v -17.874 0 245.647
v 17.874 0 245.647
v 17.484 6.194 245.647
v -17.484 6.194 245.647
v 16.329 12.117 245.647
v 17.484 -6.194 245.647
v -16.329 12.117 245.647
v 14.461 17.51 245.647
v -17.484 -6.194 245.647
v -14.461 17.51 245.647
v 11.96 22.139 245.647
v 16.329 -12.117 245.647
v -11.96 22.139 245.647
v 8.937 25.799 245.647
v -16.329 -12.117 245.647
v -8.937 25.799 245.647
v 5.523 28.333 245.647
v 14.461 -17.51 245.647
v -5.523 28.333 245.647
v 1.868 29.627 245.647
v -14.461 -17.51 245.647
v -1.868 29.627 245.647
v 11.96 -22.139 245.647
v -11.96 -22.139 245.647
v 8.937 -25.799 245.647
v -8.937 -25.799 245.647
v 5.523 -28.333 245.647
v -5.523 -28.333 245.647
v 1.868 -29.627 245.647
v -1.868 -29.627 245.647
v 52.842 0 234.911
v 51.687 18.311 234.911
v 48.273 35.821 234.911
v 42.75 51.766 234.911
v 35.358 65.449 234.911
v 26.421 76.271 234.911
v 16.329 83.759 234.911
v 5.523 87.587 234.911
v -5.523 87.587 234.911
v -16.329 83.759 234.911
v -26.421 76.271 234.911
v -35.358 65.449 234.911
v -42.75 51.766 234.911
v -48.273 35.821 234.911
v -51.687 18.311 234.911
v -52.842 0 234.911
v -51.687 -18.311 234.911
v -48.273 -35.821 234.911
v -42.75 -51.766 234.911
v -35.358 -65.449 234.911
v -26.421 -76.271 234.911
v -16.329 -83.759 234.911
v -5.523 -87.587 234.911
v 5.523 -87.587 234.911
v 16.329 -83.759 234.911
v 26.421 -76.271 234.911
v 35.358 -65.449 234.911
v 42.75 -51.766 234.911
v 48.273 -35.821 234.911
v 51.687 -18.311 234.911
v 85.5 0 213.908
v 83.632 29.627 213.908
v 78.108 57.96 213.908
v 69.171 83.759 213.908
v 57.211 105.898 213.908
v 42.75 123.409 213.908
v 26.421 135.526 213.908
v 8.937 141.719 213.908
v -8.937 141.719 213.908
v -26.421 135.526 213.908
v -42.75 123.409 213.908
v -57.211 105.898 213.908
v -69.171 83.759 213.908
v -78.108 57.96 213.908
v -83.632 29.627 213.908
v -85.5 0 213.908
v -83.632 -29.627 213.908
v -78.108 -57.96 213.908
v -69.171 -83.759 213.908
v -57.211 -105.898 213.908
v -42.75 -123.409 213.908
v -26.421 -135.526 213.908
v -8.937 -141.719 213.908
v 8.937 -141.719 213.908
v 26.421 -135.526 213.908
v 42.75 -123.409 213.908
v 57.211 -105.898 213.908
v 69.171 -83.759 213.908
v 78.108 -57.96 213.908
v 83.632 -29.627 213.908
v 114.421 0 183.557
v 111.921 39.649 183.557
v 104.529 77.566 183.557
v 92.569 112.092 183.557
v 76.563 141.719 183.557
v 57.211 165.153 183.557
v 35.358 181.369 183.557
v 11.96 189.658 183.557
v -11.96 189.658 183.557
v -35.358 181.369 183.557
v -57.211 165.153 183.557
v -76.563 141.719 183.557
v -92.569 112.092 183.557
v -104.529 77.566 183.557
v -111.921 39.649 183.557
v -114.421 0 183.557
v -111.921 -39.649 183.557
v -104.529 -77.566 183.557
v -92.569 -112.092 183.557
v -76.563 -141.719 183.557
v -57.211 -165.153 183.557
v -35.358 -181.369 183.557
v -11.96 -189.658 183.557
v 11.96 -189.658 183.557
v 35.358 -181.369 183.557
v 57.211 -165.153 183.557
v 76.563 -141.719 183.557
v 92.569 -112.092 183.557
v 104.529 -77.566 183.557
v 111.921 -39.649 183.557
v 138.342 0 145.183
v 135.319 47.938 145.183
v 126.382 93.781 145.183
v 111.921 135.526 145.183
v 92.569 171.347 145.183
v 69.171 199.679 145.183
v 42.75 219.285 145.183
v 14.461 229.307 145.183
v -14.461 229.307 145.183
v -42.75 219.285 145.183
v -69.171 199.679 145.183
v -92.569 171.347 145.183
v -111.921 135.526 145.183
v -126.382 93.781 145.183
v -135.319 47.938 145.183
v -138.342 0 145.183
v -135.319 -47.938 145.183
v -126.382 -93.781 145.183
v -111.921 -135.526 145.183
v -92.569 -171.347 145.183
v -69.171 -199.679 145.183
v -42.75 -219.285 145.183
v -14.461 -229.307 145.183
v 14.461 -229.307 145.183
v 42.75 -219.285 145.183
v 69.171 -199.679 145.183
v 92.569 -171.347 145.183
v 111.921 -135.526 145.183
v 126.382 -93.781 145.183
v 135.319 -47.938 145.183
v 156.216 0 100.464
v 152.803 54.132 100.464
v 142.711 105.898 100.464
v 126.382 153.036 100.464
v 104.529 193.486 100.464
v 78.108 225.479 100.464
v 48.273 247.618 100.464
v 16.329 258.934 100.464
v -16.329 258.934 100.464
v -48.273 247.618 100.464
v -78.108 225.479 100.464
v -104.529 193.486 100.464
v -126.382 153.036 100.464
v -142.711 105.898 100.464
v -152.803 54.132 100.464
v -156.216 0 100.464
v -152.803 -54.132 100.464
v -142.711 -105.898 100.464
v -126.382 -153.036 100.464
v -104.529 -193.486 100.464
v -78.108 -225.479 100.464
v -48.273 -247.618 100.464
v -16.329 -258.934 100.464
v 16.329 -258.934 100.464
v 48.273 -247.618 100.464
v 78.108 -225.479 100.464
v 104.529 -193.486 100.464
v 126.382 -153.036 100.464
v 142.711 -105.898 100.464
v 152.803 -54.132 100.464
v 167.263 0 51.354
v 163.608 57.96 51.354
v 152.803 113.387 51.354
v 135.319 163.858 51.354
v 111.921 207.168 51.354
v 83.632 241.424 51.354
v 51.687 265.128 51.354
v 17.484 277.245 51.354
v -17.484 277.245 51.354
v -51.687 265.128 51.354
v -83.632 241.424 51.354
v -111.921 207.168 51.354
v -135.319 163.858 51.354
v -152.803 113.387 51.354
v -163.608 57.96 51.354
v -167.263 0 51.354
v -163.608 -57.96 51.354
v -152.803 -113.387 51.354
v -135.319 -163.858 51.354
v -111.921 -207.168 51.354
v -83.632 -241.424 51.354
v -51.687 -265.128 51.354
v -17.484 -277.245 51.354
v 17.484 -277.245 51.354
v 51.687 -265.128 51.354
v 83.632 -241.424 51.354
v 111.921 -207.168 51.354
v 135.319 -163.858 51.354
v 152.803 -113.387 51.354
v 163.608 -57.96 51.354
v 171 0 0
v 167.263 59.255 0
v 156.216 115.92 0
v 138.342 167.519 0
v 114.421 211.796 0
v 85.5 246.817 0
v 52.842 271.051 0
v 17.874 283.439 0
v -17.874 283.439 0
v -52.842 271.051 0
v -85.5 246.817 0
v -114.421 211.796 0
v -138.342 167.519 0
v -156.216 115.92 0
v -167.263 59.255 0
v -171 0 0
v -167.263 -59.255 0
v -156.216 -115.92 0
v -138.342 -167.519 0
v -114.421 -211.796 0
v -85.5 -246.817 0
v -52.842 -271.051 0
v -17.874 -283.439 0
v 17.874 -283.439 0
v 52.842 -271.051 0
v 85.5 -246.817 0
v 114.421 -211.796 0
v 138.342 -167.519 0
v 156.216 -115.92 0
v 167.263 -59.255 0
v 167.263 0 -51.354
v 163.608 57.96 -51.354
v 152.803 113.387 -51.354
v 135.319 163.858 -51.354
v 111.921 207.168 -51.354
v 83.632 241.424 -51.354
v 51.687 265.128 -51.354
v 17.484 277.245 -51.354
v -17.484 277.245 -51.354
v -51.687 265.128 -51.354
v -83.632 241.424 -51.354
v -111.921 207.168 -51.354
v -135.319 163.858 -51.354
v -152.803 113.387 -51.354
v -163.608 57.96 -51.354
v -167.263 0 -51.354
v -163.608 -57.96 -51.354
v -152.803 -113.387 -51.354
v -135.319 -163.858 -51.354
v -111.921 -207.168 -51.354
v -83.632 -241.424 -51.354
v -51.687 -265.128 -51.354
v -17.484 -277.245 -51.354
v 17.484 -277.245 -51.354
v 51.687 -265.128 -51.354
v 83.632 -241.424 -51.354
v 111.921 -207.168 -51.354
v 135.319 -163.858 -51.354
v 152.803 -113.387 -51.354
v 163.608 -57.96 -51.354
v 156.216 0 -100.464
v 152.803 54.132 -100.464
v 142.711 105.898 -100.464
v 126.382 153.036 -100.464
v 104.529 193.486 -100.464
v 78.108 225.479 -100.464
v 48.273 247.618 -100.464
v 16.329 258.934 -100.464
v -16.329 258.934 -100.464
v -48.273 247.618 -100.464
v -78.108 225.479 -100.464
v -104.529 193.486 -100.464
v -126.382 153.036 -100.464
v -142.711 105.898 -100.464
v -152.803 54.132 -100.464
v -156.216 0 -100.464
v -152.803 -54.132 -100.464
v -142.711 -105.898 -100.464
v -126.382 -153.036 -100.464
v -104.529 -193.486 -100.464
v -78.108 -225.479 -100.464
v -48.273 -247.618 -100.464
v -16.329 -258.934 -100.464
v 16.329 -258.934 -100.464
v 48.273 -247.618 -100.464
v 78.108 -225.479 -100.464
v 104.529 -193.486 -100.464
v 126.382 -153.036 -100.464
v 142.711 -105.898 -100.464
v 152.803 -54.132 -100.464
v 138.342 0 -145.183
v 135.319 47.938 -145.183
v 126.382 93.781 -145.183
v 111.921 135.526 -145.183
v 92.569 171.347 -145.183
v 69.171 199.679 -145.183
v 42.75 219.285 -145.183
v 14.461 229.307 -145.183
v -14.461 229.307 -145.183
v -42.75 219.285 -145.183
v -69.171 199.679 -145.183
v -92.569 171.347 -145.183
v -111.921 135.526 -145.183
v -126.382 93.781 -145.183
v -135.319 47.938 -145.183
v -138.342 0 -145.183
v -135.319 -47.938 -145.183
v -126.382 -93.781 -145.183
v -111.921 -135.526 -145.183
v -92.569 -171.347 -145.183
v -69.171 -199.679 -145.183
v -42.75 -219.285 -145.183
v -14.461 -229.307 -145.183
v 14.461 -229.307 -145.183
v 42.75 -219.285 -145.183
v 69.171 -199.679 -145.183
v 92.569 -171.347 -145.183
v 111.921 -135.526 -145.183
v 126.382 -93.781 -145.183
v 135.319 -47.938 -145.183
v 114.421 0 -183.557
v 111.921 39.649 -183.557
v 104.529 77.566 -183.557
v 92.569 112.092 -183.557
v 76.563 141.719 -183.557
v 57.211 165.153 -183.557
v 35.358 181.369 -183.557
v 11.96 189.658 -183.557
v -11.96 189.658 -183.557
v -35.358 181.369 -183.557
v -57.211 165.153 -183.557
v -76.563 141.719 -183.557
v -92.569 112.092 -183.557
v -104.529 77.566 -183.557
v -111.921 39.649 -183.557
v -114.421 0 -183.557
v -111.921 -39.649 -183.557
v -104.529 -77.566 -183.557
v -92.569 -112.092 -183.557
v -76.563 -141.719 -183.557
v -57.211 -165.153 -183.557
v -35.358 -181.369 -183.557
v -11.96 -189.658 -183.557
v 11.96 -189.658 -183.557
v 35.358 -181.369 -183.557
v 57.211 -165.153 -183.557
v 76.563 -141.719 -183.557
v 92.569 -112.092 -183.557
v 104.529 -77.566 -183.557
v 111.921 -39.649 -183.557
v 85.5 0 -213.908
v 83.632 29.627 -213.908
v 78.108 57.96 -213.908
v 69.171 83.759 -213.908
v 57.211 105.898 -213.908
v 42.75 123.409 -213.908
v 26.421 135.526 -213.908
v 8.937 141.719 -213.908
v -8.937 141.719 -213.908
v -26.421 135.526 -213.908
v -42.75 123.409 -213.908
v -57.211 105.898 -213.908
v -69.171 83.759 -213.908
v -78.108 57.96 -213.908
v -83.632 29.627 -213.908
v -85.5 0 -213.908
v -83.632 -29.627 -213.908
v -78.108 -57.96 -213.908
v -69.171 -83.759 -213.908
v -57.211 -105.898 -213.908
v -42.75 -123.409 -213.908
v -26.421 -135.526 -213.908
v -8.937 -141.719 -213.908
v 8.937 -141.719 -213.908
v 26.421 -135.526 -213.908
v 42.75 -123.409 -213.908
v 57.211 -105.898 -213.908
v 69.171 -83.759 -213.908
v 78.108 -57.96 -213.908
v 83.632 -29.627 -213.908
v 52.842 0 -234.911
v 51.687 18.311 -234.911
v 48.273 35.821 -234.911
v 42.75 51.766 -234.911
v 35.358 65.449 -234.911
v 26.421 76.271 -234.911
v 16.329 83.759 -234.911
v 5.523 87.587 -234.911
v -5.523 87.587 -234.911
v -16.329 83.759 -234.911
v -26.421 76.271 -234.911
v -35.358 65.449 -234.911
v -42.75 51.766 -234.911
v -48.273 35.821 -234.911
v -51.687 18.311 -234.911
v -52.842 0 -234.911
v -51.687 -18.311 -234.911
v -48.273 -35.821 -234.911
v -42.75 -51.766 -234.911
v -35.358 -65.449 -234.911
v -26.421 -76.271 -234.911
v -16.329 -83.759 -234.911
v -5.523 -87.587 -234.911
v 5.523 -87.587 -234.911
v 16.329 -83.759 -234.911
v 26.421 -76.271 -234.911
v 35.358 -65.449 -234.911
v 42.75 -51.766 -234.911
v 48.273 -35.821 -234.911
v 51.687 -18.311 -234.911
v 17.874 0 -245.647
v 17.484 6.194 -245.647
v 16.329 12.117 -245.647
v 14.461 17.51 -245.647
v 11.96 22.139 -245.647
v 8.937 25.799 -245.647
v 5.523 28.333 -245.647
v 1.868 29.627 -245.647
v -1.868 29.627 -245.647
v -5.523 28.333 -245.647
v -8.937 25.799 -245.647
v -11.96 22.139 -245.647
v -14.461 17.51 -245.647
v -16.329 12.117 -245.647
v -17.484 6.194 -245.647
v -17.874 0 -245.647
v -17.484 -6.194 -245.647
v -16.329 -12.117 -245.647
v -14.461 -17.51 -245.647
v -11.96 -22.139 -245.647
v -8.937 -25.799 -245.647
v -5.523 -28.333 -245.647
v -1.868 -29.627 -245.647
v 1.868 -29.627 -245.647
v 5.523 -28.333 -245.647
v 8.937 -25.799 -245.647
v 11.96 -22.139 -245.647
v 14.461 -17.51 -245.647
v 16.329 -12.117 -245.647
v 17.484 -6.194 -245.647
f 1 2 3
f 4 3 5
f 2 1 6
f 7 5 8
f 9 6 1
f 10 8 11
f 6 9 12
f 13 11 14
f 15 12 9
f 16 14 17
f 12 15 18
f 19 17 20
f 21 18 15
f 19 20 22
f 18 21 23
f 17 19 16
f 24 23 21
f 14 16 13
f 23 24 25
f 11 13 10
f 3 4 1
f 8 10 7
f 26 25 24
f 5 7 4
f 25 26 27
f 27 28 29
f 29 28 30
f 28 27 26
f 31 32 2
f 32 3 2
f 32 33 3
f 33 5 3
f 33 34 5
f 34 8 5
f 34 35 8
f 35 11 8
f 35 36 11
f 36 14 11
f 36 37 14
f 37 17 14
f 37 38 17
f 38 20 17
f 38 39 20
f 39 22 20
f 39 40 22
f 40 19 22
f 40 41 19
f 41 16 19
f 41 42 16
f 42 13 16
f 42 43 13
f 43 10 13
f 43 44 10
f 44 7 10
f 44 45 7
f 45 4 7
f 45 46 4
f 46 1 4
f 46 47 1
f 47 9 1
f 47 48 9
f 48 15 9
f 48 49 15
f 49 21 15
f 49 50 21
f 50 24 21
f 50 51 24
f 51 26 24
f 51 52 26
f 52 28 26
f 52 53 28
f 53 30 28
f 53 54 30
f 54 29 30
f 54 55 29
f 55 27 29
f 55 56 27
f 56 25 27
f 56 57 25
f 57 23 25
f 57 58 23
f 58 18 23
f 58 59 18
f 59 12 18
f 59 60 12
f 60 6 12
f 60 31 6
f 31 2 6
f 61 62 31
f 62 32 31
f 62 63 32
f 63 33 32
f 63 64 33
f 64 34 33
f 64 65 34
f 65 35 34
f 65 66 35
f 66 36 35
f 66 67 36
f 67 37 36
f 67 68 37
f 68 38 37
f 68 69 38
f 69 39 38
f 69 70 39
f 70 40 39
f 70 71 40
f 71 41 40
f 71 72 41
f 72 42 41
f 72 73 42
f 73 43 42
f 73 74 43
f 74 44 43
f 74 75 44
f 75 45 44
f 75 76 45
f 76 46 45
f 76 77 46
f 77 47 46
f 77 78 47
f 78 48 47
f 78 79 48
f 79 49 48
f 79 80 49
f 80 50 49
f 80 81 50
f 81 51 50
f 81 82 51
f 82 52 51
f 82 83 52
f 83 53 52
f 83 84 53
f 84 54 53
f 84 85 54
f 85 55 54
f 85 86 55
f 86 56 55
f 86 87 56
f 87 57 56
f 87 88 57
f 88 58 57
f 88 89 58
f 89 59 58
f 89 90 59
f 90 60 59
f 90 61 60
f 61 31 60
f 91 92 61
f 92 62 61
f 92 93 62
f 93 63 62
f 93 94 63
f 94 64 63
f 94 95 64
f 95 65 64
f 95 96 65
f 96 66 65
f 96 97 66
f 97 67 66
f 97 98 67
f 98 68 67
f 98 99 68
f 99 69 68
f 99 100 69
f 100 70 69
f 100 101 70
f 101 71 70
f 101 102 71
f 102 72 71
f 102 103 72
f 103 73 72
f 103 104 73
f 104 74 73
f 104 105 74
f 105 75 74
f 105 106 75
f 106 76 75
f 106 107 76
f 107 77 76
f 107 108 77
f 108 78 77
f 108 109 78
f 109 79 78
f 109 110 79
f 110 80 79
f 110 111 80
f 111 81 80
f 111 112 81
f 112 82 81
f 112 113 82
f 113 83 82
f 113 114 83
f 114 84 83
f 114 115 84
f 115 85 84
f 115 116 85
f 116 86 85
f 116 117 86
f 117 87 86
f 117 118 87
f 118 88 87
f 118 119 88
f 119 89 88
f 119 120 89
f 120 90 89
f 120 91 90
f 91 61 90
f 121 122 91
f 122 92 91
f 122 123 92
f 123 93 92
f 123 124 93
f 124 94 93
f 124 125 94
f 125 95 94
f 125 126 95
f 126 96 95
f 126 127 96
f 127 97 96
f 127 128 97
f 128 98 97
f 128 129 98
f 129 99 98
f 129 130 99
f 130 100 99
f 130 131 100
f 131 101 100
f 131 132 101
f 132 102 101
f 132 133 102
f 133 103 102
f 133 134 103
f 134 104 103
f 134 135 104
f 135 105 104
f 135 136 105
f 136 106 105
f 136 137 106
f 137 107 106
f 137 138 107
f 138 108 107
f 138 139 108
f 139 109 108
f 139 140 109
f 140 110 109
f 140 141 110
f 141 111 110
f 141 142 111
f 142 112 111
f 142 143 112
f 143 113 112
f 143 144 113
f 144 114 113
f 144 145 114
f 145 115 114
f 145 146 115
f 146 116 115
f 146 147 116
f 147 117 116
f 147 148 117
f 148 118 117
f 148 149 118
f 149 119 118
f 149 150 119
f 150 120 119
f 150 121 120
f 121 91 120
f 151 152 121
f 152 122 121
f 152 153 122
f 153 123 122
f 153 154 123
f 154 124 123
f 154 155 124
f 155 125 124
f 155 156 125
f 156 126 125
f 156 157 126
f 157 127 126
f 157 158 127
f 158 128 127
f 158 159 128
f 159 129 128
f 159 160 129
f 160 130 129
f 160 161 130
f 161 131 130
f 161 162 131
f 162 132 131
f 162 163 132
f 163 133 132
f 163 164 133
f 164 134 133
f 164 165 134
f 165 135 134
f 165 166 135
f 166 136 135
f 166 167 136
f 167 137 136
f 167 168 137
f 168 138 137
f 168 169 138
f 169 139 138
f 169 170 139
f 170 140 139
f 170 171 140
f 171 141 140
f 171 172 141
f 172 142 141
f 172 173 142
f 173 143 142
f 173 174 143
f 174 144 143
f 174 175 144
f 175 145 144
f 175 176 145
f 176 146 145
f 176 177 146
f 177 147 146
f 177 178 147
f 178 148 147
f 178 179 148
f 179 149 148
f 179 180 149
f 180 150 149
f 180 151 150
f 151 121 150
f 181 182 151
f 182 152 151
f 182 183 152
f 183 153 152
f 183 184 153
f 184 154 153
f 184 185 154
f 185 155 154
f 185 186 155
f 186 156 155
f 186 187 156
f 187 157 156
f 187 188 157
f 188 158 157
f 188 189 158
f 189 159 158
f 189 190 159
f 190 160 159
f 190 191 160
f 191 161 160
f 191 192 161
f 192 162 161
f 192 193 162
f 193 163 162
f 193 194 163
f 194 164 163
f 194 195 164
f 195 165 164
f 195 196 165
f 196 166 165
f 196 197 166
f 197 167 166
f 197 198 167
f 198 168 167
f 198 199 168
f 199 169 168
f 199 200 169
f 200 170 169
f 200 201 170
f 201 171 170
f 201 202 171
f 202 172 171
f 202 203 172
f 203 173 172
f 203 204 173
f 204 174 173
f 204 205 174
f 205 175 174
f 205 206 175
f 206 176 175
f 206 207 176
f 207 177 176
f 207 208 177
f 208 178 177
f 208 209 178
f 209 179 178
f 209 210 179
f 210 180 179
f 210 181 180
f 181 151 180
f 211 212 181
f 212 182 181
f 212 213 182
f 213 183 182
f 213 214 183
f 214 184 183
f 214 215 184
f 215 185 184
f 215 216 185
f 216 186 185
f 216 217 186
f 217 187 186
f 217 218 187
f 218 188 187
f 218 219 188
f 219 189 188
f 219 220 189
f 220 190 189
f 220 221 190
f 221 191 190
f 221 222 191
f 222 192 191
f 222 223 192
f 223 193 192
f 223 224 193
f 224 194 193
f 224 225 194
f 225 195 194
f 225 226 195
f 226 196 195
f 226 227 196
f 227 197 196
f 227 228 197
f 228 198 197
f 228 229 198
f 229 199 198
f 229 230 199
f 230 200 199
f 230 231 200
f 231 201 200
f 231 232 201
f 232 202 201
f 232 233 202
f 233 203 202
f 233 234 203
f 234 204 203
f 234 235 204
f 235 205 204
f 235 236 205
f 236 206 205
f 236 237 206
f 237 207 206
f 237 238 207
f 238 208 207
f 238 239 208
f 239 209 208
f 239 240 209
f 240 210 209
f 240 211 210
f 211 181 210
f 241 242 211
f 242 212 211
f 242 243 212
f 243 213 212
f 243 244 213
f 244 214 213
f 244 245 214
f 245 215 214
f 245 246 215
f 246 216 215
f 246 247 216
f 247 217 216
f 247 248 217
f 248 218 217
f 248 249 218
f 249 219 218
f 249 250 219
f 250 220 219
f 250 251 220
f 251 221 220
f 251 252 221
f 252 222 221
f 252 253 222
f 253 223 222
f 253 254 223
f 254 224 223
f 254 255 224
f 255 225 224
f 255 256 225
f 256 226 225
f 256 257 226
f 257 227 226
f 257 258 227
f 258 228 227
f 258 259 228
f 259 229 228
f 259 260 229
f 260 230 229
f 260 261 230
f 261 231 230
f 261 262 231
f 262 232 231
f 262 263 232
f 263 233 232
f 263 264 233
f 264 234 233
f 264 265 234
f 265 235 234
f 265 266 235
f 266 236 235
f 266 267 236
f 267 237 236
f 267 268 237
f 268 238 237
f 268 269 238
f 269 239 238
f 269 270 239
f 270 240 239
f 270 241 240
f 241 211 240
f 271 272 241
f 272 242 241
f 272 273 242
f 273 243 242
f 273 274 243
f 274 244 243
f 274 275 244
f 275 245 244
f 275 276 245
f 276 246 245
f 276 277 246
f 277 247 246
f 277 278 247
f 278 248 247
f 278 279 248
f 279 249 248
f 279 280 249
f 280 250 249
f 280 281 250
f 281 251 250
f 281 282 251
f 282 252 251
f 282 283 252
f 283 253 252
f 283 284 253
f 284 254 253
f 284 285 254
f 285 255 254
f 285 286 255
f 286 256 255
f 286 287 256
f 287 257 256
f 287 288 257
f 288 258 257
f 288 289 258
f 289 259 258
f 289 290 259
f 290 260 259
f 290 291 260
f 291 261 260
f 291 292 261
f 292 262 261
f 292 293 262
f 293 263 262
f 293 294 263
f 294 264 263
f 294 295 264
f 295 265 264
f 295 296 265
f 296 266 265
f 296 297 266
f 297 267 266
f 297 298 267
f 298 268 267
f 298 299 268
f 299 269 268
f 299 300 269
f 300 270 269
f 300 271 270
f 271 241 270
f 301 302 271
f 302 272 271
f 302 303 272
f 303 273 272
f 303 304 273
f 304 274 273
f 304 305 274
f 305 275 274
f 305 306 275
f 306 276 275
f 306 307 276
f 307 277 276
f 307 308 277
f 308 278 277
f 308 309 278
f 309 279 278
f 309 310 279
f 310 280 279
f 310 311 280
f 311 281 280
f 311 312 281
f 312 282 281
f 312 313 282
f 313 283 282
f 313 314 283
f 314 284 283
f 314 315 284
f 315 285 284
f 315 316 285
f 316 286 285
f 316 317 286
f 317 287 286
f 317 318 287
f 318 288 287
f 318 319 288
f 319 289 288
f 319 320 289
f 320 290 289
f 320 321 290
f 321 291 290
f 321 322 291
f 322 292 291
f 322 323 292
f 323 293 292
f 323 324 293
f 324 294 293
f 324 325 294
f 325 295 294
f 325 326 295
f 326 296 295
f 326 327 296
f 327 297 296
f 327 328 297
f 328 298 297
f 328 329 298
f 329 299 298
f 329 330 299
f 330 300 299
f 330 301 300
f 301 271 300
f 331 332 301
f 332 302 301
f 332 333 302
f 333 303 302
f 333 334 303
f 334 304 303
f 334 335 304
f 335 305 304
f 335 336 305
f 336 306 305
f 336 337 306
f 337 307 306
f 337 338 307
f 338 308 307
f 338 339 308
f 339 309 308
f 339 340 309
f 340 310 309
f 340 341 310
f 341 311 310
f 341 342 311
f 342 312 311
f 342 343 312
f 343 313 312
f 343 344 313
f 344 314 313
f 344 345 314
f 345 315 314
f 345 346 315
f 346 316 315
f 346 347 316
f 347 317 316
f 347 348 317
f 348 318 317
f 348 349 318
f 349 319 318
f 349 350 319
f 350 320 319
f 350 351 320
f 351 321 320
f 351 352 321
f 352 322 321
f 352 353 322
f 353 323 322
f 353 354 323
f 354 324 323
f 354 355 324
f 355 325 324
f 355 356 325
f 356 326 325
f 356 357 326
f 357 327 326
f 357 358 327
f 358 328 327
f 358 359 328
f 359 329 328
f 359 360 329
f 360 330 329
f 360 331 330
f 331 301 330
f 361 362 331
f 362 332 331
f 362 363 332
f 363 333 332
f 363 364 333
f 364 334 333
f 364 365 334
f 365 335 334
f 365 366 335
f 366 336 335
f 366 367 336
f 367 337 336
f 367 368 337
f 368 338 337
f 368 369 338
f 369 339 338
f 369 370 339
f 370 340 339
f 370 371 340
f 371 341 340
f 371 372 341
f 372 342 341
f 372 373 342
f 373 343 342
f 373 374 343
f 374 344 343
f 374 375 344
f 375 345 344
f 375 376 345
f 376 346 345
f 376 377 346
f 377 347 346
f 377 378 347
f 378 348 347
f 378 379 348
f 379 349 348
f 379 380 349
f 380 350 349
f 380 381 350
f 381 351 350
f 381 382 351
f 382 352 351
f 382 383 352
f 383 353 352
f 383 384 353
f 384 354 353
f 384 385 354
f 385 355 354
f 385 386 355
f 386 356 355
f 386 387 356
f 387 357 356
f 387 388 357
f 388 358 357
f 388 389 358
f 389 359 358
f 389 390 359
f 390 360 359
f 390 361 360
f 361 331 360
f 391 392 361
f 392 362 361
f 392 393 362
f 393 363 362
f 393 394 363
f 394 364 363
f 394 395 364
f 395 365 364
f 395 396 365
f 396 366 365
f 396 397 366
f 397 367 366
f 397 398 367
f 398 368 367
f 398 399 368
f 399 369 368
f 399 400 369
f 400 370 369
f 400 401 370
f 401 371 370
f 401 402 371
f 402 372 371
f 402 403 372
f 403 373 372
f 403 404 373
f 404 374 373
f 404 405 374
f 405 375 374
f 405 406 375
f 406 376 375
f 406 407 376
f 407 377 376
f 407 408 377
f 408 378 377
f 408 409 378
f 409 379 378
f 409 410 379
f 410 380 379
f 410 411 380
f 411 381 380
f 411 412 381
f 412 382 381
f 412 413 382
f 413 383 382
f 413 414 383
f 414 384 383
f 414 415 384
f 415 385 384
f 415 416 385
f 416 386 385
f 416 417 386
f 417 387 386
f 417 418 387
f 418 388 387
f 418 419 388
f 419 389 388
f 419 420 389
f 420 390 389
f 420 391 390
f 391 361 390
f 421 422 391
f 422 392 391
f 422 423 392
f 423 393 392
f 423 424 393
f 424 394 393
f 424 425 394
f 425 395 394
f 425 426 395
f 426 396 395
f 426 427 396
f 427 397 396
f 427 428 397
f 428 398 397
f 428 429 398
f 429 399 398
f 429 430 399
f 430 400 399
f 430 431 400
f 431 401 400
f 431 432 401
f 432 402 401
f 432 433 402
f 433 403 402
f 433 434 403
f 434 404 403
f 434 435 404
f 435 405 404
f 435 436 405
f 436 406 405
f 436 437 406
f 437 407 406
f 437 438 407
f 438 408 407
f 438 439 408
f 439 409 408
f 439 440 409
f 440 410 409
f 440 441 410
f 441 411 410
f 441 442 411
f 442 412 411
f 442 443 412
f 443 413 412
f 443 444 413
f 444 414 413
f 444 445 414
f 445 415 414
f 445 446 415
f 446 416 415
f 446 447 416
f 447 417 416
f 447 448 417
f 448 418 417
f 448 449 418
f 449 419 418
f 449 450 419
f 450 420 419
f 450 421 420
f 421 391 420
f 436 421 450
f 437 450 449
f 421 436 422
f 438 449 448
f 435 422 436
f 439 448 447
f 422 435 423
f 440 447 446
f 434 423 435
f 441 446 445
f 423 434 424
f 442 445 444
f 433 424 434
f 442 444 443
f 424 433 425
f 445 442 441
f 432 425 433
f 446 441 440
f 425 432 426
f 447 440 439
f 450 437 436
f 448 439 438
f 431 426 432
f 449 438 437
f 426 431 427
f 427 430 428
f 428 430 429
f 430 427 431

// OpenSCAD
// Generated by SolidPython 1.0.1 on 2020-07-29 00:46:49


scale(v = [9, 15, 13]) {
	sphere(r = 19);
}
/***********************************************
*********      SolidPython code:      **********
************************************************
 
# import packages: SolidPython
from solid import *
from solid.utils import *
from itertools import chain, combinations, permutations


class Resize:

    def __init__(self, scad_file):
        self.scad_file = scad_file
        #self.scad_file = import_scad(scad_file)
        # cone/cylinder param:
        self.r1 = 0
        self.r2 = 0
        self.h = 0
        # rectangular prism param:
        self.w = 0
        self.l = 0
        # ellipse param:
        self.r = 0

    # import OpenScad code (file name corresponds to shape)


    # classify shape + parameters
    def assign(self, param1, param2, param3):
        if self.scad_file == 'cone.scad':
            self.r1 = param1
            self.r2 = param2
            self.h = param3
        elif self.scad_file == 'cylinder.scad':
            self.r1 = param1
            self.r2 = param2
            self.h = param3
        elif self.scad_file == 'rectangularPrism.scad':
            self.h = param1
            self.l = param2
            self.w = param3
        else:
            self.r = param1
            self.h = param2

    # resize parameters
    def iterate(self):
        x = range(3, 20, 2)
        i = 1
        if self.scad_file == 'cone.scad':
            tempList = list(permutations(x, 2))
            for temp in tempList:
                param1 = temp[0]
                param2 = temp[1]
                filepath = 'produced_scad_files/' + 'cone' + str(param1) + '_' + str(param2) + '_' + '.scad'
                scad_render_to_file(cylinder(h=param1, r1=param2, r2=0), filepath)

        elif self.scad_file == 'cylinder.scad':
            tempList = list(permutations(x, 3))
            for temp in tempList:
                param1 = temp[0]
                param2 = temp[1]
                filepath = 'produced_scad_files/' + 'cylinder' + str(param1) + '_' + str(param2) + '_' + '.scad'
                scad_render_to_file(cylinder(h=param1, r1=param2, r2=param2), filepath)

        elif self.scad_file == 'rectangularPrism.scad':
            tempList = list(permutations(x, 3))
            for temp in tempList:
                param1 = temp[0]
                param2 = temp[1]
                param3 = temp[2]
                filepath = 'produced_scad_files/' + 'rectangularPrism' + str(param1) + '_' + str(param2) + '_' + str(
                    param3) + '.scad'
                scad_render_to_file(cube(size=(param1, param2, param3)), filepath)

        elif self.scad_file == 'ellipse.scad':
            tempList = list(permutations(x, 4))
            for temp in tempList:
                param1 = temp[0]
                param2 = temp[1]
                param3 = temp[2]
                param4 = temp[3]
                filepath = 'produced_scad_files/' + 'ellipse' + str(param1) + '_' + str(param2) + '_' + str(param3) + '_' + str(param4) + '.scad'
                scad_render_to_file(scale([param1, param2, param3])(sphere(r=param4)), filepath)

    def render_to_scadfile(self):
        scad_render_to_file(scad, 'example.scad') 
 
************************************************/
